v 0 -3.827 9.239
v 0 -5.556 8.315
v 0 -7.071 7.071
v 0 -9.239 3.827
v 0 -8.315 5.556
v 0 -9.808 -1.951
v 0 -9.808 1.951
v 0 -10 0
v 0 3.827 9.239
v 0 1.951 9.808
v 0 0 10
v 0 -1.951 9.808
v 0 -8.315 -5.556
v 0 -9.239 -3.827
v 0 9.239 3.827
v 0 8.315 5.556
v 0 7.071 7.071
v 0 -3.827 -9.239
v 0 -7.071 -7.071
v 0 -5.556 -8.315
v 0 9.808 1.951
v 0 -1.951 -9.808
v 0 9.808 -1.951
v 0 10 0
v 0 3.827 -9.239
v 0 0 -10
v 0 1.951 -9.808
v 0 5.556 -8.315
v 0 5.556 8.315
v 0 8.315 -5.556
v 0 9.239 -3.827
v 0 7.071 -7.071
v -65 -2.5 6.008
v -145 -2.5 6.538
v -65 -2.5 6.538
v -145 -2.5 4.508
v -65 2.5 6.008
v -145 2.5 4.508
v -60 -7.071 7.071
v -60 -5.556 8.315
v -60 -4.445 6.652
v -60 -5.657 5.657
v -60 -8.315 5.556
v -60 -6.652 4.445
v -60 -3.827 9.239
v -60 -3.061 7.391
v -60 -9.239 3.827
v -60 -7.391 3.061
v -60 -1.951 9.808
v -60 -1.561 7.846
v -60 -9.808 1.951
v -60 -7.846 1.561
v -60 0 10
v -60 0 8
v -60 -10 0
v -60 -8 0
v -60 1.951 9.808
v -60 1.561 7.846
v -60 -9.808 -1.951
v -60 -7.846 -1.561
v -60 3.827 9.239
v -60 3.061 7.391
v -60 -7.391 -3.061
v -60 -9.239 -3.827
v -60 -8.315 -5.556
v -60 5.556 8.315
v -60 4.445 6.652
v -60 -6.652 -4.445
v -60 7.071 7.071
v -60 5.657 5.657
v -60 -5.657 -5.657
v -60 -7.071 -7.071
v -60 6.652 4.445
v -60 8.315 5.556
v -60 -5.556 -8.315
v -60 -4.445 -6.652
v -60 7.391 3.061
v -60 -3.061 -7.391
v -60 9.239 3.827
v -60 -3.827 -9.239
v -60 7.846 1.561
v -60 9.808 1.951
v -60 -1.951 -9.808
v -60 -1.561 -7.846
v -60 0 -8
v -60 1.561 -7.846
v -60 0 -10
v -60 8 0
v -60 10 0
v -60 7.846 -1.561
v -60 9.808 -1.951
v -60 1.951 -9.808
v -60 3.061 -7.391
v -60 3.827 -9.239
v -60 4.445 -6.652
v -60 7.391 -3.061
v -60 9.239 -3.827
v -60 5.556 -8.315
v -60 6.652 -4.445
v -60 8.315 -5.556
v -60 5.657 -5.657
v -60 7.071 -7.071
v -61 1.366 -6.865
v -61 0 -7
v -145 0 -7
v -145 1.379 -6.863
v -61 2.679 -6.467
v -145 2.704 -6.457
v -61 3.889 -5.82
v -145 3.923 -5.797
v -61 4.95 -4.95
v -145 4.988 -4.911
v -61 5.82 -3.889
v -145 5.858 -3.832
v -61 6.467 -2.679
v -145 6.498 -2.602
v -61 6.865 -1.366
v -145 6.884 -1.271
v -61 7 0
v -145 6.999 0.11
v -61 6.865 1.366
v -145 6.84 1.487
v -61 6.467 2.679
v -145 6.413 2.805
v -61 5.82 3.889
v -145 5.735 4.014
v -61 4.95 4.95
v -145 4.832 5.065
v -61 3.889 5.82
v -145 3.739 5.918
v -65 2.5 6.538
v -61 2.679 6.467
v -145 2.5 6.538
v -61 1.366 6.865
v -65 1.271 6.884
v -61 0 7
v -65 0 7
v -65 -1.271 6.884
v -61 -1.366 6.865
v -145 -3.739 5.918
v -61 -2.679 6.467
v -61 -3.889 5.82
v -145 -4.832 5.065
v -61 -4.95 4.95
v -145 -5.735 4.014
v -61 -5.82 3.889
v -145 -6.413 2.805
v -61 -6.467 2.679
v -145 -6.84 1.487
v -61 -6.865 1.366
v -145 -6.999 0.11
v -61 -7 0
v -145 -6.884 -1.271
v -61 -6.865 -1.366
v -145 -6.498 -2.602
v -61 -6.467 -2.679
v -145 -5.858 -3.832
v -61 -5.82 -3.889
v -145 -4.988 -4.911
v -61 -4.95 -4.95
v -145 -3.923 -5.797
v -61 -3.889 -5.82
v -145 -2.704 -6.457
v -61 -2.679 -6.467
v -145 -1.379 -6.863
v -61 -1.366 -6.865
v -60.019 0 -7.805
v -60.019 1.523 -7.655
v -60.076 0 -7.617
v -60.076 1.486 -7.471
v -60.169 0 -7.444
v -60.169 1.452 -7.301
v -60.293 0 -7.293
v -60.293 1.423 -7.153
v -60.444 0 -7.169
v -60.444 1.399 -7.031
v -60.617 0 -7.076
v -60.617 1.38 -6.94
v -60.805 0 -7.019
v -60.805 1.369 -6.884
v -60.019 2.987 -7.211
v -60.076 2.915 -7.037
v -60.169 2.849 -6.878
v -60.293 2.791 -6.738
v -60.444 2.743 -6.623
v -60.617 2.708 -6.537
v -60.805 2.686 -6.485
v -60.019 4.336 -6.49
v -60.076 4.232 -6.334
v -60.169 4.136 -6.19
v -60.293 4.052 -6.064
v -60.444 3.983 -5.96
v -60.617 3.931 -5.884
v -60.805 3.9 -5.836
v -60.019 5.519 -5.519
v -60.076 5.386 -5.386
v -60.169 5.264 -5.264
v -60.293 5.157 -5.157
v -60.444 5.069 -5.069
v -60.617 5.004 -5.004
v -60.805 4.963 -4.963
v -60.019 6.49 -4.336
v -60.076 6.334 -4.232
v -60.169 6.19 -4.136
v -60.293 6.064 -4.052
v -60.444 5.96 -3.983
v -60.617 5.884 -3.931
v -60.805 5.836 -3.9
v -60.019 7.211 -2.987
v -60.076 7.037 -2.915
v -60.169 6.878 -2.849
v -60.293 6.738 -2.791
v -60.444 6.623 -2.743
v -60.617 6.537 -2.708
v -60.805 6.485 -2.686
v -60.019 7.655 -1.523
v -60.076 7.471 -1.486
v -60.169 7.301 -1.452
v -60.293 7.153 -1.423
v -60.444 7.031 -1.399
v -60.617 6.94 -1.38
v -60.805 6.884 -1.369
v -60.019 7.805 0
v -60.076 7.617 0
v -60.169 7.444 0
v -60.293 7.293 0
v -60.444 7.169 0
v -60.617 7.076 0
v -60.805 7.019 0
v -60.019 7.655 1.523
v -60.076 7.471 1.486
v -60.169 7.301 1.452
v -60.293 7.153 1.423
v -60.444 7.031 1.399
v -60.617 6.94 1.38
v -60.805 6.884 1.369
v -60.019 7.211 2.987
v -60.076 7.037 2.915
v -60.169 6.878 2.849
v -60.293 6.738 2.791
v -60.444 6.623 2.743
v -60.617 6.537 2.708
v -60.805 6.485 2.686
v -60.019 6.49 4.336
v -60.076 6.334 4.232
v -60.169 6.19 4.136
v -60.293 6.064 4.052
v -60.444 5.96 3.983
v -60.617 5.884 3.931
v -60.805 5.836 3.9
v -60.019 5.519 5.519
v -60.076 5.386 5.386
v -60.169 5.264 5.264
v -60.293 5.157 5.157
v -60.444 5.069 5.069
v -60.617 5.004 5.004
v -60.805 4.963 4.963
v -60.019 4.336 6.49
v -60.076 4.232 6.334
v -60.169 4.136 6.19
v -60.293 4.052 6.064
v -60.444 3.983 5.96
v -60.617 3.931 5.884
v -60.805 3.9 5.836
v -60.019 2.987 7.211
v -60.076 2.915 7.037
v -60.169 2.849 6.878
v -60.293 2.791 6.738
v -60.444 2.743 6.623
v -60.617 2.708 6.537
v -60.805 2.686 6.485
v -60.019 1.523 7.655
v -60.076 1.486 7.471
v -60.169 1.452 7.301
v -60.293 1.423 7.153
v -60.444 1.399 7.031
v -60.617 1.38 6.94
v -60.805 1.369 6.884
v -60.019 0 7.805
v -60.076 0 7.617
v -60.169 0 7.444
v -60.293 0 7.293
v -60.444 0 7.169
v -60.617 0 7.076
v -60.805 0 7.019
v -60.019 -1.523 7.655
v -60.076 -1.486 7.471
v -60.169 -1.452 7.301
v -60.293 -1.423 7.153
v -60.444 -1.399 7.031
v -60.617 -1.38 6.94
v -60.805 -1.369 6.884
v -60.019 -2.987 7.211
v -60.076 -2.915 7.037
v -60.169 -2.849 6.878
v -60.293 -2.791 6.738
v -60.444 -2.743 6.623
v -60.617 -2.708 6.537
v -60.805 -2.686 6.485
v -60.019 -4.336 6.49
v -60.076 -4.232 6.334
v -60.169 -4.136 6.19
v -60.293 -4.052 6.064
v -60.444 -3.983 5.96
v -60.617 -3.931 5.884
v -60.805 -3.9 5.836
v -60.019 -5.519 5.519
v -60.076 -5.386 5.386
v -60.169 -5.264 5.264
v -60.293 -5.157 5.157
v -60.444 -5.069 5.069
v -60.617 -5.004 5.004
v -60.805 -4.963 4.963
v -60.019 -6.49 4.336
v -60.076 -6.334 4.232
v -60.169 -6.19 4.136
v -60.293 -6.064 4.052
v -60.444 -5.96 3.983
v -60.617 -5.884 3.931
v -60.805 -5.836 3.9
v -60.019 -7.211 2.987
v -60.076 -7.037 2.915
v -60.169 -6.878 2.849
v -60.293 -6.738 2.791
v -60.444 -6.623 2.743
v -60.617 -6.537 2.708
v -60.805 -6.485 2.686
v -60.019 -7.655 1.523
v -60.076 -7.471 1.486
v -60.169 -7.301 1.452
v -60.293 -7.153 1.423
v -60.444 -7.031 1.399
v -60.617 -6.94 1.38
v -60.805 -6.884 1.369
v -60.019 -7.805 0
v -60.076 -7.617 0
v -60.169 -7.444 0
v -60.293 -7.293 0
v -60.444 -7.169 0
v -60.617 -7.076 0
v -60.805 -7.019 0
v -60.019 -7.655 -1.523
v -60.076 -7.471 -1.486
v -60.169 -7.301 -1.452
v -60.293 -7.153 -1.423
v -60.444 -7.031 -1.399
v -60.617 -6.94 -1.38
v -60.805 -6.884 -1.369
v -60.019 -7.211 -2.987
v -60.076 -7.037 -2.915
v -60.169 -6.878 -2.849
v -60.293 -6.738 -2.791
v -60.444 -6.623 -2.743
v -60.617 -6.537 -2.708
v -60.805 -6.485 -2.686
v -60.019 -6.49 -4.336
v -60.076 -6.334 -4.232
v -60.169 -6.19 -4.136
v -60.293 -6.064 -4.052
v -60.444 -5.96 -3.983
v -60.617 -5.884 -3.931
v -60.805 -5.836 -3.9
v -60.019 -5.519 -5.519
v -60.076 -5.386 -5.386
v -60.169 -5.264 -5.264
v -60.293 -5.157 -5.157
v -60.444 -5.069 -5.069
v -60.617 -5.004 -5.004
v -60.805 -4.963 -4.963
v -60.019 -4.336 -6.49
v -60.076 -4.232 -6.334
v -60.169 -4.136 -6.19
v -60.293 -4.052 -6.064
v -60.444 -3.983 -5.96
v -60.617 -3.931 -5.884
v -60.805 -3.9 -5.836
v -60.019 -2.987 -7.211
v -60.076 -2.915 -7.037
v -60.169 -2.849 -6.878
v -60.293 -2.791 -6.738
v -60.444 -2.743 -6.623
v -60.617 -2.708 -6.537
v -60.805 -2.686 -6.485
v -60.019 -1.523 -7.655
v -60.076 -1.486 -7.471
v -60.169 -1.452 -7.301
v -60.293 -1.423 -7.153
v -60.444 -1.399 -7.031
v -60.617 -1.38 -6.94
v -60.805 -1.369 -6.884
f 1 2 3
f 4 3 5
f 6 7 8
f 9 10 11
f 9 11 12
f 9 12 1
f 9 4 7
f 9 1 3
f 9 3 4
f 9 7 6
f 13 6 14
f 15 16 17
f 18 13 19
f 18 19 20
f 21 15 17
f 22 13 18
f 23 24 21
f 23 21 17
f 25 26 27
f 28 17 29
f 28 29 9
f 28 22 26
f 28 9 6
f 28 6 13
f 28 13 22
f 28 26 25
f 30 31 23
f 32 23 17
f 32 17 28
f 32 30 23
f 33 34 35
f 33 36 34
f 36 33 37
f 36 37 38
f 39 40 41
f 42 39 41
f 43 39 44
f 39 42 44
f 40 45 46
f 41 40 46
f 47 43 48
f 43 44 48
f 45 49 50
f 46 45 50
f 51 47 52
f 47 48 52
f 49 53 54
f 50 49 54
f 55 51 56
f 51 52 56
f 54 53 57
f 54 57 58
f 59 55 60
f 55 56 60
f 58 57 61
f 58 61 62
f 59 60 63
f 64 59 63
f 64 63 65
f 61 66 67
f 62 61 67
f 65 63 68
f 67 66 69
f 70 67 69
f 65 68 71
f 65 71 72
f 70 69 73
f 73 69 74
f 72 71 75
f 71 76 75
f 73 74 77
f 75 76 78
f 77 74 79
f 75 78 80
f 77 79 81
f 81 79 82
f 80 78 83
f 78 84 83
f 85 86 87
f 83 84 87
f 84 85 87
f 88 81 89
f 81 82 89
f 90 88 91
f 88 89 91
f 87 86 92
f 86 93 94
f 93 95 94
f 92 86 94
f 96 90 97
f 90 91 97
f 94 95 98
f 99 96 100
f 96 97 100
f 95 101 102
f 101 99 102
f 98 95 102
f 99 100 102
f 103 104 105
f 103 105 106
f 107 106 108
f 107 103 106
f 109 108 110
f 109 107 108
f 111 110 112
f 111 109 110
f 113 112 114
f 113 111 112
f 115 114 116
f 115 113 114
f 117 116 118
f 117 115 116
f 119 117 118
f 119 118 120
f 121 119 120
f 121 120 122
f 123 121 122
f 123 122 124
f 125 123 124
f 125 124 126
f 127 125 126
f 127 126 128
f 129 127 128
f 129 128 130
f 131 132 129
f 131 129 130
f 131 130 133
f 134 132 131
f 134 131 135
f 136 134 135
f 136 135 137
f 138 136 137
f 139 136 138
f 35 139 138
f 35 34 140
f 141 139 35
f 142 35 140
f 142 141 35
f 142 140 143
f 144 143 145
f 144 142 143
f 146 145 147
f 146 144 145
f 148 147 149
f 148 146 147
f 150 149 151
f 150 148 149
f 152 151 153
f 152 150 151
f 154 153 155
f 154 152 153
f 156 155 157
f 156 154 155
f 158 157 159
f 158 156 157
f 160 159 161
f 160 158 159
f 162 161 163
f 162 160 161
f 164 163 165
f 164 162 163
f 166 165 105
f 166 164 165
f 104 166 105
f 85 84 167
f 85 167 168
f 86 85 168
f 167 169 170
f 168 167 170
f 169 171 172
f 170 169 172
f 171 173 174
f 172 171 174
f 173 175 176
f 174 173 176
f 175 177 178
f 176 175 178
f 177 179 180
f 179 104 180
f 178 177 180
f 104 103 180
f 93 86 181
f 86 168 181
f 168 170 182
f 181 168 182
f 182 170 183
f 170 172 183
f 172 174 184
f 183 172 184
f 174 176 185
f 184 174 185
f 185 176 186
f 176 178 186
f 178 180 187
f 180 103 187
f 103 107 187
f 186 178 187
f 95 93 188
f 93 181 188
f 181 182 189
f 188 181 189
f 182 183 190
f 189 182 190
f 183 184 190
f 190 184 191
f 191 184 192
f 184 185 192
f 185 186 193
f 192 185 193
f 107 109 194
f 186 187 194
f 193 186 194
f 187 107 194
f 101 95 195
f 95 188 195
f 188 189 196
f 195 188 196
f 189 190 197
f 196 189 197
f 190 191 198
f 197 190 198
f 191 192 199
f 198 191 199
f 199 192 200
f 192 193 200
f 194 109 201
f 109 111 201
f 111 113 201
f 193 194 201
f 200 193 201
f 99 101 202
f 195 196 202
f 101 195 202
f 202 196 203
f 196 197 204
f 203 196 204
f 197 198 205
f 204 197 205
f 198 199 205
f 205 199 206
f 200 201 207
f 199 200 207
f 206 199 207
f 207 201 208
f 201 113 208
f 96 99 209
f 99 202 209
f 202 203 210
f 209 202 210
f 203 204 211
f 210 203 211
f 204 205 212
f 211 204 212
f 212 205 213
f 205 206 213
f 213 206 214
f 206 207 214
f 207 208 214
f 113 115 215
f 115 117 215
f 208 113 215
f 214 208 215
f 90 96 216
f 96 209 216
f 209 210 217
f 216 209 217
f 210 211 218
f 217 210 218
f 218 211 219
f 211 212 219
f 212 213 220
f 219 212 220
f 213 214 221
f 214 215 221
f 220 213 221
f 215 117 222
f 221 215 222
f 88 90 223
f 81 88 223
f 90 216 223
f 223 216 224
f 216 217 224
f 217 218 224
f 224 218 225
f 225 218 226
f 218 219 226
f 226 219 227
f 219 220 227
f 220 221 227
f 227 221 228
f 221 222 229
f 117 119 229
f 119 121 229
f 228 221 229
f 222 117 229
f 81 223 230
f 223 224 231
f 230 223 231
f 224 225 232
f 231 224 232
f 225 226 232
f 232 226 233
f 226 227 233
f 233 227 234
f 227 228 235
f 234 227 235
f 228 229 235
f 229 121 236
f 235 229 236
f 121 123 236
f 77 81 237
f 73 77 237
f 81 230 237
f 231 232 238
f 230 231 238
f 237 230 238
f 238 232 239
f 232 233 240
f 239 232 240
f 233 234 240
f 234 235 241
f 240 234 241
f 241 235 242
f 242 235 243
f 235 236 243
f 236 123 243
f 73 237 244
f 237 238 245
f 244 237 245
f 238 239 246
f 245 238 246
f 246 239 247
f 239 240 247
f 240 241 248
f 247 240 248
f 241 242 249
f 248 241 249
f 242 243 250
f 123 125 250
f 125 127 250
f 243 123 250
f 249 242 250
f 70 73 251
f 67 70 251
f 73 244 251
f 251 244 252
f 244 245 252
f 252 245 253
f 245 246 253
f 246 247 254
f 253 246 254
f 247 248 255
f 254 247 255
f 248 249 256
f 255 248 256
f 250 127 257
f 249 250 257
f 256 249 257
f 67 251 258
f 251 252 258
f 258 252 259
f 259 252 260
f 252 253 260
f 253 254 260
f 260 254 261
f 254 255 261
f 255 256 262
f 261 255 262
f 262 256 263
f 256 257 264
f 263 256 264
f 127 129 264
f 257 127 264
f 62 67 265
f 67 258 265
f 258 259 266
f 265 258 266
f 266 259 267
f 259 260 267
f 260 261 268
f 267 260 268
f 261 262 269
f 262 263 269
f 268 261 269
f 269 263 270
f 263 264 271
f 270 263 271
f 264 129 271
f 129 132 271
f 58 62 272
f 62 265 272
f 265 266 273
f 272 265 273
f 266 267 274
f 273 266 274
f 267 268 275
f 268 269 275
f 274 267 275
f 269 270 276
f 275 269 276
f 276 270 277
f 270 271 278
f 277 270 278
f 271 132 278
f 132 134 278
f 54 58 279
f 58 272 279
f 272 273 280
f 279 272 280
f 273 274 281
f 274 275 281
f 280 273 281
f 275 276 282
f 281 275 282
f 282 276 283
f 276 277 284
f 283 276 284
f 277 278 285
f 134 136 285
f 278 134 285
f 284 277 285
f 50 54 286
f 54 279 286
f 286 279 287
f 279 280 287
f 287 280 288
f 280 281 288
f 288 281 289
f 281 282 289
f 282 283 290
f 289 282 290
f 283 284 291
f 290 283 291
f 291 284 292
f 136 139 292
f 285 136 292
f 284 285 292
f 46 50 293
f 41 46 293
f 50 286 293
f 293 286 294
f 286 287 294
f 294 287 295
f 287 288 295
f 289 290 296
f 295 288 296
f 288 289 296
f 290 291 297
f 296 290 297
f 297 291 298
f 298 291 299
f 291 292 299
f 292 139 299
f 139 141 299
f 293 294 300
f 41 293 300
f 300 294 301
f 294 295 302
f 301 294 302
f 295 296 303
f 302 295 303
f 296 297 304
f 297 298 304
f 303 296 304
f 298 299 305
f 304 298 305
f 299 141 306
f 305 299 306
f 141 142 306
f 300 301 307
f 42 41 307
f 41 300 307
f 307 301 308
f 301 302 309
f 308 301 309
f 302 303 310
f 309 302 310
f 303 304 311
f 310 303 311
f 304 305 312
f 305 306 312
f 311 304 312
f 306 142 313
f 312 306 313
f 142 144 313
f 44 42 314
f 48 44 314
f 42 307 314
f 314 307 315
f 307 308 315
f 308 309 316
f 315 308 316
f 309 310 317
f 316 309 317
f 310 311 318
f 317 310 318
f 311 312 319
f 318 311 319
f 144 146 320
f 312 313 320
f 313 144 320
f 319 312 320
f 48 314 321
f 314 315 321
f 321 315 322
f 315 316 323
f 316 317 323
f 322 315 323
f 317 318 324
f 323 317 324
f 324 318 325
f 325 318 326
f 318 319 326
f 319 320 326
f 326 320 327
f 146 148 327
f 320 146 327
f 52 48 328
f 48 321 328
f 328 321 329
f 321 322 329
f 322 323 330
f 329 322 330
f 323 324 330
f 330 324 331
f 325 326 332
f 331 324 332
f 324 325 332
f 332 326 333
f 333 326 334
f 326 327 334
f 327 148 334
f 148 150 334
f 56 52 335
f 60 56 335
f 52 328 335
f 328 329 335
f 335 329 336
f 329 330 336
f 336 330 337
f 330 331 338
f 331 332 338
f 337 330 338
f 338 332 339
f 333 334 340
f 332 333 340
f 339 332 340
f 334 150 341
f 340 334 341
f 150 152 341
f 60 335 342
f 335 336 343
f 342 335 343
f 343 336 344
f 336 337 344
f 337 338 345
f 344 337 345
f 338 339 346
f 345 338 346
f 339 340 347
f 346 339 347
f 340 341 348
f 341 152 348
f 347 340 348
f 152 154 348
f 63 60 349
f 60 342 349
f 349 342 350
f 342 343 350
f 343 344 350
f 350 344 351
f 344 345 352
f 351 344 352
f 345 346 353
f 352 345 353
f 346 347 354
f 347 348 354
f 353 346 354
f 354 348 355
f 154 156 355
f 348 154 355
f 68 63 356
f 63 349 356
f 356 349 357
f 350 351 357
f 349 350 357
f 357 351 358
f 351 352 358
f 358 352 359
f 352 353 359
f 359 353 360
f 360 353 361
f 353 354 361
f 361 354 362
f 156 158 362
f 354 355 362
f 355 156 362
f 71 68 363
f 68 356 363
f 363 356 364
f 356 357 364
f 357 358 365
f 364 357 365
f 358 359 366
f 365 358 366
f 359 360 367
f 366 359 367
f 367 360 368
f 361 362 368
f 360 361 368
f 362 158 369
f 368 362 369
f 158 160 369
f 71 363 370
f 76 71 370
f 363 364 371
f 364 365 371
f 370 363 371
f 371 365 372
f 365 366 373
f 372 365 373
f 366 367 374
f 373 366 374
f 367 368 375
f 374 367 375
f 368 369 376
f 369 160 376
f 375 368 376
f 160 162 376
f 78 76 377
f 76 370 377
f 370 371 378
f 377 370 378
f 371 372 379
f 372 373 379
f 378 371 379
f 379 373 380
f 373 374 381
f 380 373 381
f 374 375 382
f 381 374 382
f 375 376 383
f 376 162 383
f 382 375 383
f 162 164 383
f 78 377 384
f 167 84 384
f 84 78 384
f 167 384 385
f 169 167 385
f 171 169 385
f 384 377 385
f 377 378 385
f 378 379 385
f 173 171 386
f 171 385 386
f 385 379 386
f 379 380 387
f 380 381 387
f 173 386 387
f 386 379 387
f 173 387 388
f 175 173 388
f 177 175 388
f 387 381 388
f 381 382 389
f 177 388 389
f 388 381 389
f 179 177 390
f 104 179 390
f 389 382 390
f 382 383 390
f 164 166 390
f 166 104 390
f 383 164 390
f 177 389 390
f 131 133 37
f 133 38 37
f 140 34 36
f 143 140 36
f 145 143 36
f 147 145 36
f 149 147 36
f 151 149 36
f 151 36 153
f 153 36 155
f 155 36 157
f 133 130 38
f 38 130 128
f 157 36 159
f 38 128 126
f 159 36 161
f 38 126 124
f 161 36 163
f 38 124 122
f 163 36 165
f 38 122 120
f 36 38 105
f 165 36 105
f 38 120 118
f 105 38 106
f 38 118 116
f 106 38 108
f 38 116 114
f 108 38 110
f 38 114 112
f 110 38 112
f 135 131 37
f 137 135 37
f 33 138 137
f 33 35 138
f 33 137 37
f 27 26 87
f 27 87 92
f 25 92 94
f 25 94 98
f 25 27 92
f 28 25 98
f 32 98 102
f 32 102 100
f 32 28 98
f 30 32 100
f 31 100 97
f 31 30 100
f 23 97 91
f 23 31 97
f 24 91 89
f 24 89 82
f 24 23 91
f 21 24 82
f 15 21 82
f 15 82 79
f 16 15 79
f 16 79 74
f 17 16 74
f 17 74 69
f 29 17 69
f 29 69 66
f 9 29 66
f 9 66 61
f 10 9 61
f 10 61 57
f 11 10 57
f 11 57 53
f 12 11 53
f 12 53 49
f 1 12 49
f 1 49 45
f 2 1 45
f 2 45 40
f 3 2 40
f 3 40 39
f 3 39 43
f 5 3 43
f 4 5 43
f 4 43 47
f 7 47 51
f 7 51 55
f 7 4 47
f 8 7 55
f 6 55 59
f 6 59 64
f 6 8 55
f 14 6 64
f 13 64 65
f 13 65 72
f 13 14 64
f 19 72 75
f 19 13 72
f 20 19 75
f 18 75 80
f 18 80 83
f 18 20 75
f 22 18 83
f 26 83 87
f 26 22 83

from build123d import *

# Parameters (mm, degrees)
SKETCH1_R           = 10
BOSS_EXTRUDE1_DEPTH = 145
SKETCH2_R           = 10
SKETCH2_R_2         = 7
CUT_EXTRUDE1_DEPTH  = 97
FILLET1_R           = 1
CUT_LOFT1_START     = -2.5
CUT_LOFT1_DEPTH     = 5


# Read off the part's stored shape, not the designer's step: Cut-Loft1
with BuildPart() as part:
    # Sketch1 → Boss-Extrude1 (new body)
    with BuildSketch(Plane(origin=(0, 0, 0), x_dir=(0, 0, -1), z_dir=(1, 0, 0))):
        Circle(SKETCH1_R)
    extrude(amount=-BOSS_EXTRUDE1_DEPTH)

    # Sketch2 → Cut-Extrude1 (cut)
    with BuildSketch(Plane(origin=(-60, 0, 0), x_dir=(0, 0, -1), z_dir=(1, 0, 0))):
        Circle(SKETCH2_R)
        Circle(SKETCH2_R_2, mode=Mode.SUBTRACT)
    extrude(amount=-CUT_EXTRUDE1_DEPTH, mode=Mode.SUBTRACT)

    # Fillet1
    fillet1_edges = [part.edges().sort_by_distance(p)[0] for p in [
        (-60, 0, 7),
    ]]
    fillet(fillet1_edges, radius=FILLET1_R)

    # Cut-Loft1 outline → Cut-Loft1 (cut)
    with BuildSketch(Plane(origin=(0, 0, 0), x_dir=(1, 0, 0), z_dir=(0, 1, 0)).offset(CUT_LOFT1_START)):
        Polygon((-65, -8), (-65, -6.008348415), (-145, -4.508348415), (-145, -8), align=None)
    extrude(amount=CUT_LOFT1_DEPTH, mode=Mode.SUBTRACT)


solid = part.part
